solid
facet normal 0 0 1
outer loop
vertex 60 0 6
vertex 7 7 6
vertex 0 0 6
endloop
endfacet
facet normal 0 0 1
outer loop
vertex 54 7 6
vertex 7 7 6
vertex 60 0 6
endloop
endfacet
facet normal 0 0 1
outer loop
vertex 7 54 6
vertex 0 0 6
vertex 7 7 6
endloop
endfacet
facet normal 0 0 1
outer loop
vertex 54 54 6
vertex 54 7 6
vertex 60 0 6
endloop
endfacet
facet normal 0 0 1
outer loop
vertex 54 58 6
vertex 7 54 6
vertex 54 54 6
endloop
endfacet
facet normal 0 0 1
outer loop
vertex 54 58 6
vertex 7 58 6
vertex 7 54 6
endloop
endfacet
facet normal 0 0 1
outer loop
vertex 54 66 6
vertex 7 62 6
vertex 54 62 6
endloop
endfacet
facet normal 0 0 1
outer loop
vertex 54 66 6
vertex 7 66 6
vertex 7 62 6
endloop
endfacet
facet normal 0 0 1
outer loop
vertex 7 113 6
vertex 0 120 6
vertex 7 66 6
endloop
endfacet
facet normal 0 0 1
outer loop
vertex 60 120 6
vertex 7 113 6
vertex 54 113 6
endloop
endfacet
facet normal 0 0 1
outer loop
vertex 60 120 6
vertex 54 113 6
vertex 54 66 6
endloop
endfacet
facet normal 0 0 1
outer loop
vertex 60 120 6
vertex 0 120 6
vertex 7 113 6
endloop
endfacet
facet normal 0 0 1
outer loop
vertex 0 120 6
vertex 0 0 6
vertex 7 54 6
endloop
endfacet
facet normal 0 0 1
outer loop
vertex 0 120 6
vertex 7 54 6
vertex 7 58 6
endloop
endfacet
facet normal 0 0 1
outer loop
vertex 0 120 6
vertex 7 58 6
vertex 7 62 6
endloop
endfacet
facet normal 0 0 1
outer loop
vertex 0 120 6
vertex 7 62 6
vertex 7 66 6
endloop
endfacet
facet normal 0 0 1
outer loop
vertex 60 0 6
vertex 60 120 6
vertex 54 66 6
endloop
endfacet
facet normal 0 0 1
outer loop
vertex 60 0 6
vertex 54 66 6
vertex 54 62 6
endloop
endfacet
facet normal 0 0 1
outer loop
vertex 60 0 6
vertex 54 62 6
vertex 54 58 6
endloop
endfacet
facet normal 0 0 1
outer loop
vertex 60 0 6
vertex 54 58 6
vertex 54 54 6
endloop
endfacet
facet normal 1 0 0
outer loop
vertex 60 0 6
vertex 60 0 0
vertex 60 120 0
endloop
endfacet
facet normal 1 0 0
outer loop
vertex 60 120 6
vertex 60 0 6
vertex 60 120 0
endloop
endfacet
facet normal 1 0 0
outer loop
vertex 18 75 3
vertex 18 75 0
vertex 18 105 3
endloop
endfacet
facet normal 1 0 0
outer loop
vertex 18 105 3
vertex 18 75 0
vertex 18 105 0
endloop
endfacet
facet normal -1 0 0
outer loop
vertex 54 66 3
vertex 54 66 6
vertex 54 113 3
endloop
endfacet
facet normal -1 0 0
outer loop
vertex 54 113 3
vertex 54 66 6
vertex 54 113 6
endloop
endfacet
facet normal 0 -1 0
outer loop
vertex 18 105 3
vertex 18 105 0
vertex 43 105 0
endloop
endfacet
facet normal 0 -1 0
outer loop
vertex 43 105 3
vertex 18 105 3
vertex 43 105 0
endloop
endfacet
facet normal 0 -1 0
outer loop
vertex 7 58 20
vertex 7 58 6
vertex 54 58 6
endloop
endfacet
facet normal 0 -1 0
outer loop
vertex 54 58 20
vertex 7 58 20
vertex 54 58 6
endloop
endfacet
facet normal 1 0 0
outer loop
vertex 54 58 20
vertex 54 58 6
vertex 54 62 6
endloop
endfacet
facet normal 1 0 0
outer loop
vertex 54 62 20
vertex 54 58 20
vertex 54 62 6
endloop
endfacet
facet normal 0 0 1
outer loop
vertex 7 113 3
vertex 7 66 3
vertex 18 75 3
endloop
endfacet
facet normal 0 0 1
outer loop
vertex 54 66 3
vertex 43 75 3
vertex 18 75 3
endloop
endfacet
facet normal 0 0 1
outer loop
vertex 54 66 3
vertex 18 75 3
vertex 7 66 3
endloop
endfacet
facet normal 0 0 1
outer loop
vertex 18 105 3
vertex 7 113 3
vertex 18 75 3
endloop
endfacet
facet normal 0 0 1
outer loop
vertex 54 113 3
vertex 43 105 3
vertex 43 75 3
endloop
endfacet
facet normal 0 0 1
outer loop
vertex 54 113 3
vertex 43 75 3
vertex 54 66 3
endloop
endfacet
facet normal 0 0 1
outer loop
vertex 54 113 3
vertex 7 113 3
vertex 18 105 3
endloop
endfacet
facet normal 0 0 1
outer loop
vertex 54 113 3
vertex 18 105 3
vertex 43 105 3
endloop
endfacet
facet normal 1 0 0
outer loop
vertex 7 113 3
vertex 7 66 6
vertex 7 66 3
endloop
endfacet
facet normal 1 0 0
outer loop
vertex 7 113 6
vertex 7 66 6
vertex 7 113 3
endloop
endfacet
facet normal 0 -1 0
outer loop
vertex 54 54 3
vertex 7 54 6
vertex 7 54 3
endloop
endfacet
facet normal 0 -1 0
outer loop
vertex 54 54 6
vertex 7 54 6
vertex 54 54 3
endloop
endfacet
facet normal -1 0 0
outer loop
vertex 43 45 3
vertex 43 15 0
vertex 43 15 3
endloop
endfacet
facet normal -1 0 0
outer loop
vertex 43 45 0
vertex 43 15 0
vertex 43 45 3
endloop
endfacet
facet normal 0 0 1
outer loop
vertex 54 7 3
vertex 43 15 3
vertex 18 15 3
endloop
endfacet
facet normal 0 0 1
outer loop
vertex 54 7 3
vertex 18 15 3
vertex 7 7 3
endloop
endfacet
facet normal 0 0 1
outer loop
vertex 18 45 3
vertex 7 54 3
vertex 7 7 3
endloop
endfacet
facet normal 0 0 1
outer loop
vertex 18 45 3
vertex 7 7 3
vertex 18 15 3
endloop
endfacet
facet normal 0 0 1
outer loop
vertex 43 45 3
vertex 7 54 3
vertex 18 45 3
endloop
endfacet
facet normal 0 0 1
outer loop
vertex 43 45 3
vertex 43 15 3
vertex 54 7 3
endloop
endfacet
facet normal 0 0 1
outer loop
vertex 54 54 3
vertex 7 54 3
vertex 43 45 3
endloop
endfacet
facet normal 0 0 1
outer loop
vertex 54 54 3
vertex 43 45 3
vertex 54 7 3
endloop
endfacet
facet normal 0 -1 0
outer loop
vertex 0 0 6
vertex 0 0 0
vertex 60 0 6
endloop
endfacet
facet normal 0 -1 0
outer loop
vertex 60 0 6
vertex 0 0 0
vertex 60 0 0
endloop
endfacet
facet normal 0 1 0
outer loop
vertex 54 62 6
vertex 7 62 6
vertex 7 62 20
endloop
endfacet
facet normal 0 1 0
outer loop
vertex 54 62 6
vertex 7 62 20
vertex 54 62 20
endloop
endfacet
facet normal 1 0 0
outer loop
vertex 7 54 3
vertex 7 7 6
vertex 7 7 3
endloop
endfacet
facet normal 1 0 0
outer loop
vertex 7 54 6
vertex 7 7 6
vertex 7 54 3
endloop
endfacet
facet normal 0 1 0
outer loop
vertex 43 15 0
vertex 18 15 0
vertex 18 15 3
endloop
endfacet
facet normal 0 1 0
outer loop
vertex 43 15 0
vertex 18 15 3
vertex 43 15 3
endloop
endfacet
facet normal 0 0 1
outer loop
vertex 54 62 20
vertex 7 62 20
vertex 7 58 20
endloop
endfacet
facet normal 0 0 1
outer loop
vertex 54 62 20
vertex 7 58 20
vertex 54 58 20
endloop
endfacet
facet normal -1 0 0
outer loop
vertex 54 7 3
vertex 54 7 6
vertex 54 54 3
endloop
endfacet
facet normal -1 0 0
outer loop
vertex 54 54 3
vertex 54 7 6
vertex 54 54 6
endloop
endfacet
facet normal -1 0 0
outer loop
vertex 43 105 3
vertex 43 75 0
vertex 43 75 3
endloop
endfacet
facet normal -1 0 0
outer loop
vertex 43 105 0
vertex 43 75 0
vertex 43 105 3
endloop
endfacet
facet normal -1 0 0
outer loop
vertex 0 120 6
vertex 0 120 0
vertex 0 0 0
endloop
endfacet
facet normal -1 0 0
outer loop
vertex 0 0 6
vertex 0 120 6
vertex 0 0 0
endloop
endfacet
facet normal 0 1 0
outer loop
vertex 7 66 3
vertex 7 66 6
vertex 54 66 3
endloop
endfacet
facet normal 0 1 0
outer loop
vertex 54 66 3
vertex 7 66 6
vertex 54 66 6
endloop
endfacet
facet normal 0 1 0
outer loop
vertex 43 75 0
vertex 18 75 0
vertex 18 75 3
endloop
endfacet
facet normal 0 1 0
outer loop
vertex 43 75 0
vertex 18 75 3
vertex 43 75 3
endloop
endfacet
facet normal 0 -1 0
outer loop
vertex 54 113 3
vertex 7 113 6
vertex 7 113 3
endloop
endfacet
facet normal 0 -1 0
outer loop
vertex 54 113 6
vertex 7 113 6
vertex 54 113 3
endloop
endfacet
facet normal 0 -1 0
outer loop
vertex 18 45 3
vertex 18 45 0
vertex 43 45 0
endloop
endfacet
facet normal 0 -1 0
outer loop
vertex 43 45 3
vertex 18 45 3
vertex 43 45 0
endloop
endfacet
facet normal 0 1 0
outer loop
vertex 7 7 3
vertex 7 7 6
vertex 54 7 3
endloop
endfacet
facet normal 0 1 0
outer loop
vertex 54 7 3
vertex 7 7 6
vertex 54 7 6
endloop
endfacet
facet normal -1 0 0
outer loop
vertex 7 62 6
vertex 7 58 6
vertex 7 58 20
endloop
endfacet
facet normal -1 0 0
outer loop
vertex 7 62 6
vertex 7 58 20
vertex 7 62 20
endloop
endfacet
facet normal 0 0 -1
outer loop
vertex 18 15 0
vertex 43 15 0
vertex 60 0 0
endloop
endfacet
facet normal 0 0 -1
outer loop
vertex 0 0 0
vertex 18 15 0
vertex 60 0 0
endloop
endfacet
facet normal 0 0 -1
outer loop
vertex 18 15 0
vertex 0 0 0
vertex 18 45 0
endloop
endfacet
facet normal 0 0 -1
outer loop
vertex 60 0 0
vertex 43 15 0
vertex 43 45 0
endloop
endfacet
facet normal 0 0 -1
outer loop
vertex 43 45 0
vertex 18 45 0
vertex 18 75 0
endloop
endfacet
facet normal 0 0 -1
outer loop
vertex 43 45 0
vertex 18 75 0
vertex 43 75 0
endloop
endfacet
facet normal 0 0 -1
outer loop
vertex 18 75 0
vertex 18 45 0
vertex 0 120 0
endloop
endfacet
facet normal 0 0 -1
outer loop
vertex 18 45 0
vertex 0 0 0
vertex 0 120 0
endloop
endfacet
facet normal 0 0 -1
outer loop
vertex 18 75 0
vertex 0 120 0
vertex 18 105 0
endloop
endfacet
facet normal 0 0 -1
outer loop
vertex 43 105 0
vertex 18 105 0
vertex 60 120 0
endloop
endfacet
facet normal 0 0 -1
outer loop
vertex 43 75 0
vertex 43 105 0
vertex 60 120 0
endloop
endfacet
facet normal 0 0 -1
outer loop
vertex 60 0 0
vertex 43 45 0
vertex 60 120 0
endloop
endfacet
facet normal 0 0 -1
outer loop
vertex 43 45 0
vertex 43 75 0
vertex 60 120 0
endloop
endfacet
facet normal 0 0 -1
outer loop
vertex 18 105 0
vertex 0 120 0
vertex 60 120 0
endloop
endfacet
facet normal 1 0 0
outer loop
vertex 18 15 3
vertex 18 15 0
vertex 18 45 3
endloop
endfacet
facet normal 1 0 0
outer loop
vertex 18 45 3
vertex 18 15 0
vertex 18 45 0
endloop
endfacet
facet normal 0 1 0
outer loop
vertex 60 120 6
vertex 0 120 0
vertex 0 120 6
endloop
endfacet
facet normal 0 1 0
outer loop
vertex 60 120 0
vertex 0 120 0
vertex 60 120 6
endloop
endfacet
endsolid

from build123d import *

# Parameters (mm, degrees)
F0_W     = 60
F0_H     = 60
F1_DEPTH = 6
F2_W     = 47
F2_H     = 47
F3_DEPTH = 3
F4_W     = 47
F4_H     = 4
F5_DEPTH = 20
F6_W     = 25
F6_H     = 30
F7_DEPTH = 25


with BuildPart() as f1:
    # F0 (on Top) → F1 (new body)
    with BuildSketch(Plane.XY):
        with Locations((30, 90)):
            Rectangle(F0_W, F0_H)
        with Locations((30, 30)):
            Rectangle(F0_W, F0_H)
    extrude(amount=F1_DEPTH)

    # F2 (on face) → F3 (cut)
    with BuildSketch(Plane.XY.offset(6)):
        with Locations((30.5, 89.5)):
            Rectangle(F2_W, F2_H)
        with Locations((30.5, 30.5)):
            Rectangle(F2_W, F2_H)
    extrude(amount=-F3_DEPTH, mode=Mode.SUBTRACT)

    # F4 (on Top) → F5 (join)
    with BuildSketch(Plane.XY):
        with Locations((30.5, 60)):
            Rectangle(F4_W, F4_H)
    extrude(amount=F5_DEPTH)

    # F6 (on Top) → F7 (cut)
    with BuildSketch(Plane.XY):
        with Locations((30.5, 30)):
            Rectangle(F6_W, F6_H)
        with Locations((30.5, 90)):
            Rectangle(F6_W, F6_H)
    extrude(amount=F7_DEPTH, mode=Mode.SUBTRACT)


solid = f1.part
